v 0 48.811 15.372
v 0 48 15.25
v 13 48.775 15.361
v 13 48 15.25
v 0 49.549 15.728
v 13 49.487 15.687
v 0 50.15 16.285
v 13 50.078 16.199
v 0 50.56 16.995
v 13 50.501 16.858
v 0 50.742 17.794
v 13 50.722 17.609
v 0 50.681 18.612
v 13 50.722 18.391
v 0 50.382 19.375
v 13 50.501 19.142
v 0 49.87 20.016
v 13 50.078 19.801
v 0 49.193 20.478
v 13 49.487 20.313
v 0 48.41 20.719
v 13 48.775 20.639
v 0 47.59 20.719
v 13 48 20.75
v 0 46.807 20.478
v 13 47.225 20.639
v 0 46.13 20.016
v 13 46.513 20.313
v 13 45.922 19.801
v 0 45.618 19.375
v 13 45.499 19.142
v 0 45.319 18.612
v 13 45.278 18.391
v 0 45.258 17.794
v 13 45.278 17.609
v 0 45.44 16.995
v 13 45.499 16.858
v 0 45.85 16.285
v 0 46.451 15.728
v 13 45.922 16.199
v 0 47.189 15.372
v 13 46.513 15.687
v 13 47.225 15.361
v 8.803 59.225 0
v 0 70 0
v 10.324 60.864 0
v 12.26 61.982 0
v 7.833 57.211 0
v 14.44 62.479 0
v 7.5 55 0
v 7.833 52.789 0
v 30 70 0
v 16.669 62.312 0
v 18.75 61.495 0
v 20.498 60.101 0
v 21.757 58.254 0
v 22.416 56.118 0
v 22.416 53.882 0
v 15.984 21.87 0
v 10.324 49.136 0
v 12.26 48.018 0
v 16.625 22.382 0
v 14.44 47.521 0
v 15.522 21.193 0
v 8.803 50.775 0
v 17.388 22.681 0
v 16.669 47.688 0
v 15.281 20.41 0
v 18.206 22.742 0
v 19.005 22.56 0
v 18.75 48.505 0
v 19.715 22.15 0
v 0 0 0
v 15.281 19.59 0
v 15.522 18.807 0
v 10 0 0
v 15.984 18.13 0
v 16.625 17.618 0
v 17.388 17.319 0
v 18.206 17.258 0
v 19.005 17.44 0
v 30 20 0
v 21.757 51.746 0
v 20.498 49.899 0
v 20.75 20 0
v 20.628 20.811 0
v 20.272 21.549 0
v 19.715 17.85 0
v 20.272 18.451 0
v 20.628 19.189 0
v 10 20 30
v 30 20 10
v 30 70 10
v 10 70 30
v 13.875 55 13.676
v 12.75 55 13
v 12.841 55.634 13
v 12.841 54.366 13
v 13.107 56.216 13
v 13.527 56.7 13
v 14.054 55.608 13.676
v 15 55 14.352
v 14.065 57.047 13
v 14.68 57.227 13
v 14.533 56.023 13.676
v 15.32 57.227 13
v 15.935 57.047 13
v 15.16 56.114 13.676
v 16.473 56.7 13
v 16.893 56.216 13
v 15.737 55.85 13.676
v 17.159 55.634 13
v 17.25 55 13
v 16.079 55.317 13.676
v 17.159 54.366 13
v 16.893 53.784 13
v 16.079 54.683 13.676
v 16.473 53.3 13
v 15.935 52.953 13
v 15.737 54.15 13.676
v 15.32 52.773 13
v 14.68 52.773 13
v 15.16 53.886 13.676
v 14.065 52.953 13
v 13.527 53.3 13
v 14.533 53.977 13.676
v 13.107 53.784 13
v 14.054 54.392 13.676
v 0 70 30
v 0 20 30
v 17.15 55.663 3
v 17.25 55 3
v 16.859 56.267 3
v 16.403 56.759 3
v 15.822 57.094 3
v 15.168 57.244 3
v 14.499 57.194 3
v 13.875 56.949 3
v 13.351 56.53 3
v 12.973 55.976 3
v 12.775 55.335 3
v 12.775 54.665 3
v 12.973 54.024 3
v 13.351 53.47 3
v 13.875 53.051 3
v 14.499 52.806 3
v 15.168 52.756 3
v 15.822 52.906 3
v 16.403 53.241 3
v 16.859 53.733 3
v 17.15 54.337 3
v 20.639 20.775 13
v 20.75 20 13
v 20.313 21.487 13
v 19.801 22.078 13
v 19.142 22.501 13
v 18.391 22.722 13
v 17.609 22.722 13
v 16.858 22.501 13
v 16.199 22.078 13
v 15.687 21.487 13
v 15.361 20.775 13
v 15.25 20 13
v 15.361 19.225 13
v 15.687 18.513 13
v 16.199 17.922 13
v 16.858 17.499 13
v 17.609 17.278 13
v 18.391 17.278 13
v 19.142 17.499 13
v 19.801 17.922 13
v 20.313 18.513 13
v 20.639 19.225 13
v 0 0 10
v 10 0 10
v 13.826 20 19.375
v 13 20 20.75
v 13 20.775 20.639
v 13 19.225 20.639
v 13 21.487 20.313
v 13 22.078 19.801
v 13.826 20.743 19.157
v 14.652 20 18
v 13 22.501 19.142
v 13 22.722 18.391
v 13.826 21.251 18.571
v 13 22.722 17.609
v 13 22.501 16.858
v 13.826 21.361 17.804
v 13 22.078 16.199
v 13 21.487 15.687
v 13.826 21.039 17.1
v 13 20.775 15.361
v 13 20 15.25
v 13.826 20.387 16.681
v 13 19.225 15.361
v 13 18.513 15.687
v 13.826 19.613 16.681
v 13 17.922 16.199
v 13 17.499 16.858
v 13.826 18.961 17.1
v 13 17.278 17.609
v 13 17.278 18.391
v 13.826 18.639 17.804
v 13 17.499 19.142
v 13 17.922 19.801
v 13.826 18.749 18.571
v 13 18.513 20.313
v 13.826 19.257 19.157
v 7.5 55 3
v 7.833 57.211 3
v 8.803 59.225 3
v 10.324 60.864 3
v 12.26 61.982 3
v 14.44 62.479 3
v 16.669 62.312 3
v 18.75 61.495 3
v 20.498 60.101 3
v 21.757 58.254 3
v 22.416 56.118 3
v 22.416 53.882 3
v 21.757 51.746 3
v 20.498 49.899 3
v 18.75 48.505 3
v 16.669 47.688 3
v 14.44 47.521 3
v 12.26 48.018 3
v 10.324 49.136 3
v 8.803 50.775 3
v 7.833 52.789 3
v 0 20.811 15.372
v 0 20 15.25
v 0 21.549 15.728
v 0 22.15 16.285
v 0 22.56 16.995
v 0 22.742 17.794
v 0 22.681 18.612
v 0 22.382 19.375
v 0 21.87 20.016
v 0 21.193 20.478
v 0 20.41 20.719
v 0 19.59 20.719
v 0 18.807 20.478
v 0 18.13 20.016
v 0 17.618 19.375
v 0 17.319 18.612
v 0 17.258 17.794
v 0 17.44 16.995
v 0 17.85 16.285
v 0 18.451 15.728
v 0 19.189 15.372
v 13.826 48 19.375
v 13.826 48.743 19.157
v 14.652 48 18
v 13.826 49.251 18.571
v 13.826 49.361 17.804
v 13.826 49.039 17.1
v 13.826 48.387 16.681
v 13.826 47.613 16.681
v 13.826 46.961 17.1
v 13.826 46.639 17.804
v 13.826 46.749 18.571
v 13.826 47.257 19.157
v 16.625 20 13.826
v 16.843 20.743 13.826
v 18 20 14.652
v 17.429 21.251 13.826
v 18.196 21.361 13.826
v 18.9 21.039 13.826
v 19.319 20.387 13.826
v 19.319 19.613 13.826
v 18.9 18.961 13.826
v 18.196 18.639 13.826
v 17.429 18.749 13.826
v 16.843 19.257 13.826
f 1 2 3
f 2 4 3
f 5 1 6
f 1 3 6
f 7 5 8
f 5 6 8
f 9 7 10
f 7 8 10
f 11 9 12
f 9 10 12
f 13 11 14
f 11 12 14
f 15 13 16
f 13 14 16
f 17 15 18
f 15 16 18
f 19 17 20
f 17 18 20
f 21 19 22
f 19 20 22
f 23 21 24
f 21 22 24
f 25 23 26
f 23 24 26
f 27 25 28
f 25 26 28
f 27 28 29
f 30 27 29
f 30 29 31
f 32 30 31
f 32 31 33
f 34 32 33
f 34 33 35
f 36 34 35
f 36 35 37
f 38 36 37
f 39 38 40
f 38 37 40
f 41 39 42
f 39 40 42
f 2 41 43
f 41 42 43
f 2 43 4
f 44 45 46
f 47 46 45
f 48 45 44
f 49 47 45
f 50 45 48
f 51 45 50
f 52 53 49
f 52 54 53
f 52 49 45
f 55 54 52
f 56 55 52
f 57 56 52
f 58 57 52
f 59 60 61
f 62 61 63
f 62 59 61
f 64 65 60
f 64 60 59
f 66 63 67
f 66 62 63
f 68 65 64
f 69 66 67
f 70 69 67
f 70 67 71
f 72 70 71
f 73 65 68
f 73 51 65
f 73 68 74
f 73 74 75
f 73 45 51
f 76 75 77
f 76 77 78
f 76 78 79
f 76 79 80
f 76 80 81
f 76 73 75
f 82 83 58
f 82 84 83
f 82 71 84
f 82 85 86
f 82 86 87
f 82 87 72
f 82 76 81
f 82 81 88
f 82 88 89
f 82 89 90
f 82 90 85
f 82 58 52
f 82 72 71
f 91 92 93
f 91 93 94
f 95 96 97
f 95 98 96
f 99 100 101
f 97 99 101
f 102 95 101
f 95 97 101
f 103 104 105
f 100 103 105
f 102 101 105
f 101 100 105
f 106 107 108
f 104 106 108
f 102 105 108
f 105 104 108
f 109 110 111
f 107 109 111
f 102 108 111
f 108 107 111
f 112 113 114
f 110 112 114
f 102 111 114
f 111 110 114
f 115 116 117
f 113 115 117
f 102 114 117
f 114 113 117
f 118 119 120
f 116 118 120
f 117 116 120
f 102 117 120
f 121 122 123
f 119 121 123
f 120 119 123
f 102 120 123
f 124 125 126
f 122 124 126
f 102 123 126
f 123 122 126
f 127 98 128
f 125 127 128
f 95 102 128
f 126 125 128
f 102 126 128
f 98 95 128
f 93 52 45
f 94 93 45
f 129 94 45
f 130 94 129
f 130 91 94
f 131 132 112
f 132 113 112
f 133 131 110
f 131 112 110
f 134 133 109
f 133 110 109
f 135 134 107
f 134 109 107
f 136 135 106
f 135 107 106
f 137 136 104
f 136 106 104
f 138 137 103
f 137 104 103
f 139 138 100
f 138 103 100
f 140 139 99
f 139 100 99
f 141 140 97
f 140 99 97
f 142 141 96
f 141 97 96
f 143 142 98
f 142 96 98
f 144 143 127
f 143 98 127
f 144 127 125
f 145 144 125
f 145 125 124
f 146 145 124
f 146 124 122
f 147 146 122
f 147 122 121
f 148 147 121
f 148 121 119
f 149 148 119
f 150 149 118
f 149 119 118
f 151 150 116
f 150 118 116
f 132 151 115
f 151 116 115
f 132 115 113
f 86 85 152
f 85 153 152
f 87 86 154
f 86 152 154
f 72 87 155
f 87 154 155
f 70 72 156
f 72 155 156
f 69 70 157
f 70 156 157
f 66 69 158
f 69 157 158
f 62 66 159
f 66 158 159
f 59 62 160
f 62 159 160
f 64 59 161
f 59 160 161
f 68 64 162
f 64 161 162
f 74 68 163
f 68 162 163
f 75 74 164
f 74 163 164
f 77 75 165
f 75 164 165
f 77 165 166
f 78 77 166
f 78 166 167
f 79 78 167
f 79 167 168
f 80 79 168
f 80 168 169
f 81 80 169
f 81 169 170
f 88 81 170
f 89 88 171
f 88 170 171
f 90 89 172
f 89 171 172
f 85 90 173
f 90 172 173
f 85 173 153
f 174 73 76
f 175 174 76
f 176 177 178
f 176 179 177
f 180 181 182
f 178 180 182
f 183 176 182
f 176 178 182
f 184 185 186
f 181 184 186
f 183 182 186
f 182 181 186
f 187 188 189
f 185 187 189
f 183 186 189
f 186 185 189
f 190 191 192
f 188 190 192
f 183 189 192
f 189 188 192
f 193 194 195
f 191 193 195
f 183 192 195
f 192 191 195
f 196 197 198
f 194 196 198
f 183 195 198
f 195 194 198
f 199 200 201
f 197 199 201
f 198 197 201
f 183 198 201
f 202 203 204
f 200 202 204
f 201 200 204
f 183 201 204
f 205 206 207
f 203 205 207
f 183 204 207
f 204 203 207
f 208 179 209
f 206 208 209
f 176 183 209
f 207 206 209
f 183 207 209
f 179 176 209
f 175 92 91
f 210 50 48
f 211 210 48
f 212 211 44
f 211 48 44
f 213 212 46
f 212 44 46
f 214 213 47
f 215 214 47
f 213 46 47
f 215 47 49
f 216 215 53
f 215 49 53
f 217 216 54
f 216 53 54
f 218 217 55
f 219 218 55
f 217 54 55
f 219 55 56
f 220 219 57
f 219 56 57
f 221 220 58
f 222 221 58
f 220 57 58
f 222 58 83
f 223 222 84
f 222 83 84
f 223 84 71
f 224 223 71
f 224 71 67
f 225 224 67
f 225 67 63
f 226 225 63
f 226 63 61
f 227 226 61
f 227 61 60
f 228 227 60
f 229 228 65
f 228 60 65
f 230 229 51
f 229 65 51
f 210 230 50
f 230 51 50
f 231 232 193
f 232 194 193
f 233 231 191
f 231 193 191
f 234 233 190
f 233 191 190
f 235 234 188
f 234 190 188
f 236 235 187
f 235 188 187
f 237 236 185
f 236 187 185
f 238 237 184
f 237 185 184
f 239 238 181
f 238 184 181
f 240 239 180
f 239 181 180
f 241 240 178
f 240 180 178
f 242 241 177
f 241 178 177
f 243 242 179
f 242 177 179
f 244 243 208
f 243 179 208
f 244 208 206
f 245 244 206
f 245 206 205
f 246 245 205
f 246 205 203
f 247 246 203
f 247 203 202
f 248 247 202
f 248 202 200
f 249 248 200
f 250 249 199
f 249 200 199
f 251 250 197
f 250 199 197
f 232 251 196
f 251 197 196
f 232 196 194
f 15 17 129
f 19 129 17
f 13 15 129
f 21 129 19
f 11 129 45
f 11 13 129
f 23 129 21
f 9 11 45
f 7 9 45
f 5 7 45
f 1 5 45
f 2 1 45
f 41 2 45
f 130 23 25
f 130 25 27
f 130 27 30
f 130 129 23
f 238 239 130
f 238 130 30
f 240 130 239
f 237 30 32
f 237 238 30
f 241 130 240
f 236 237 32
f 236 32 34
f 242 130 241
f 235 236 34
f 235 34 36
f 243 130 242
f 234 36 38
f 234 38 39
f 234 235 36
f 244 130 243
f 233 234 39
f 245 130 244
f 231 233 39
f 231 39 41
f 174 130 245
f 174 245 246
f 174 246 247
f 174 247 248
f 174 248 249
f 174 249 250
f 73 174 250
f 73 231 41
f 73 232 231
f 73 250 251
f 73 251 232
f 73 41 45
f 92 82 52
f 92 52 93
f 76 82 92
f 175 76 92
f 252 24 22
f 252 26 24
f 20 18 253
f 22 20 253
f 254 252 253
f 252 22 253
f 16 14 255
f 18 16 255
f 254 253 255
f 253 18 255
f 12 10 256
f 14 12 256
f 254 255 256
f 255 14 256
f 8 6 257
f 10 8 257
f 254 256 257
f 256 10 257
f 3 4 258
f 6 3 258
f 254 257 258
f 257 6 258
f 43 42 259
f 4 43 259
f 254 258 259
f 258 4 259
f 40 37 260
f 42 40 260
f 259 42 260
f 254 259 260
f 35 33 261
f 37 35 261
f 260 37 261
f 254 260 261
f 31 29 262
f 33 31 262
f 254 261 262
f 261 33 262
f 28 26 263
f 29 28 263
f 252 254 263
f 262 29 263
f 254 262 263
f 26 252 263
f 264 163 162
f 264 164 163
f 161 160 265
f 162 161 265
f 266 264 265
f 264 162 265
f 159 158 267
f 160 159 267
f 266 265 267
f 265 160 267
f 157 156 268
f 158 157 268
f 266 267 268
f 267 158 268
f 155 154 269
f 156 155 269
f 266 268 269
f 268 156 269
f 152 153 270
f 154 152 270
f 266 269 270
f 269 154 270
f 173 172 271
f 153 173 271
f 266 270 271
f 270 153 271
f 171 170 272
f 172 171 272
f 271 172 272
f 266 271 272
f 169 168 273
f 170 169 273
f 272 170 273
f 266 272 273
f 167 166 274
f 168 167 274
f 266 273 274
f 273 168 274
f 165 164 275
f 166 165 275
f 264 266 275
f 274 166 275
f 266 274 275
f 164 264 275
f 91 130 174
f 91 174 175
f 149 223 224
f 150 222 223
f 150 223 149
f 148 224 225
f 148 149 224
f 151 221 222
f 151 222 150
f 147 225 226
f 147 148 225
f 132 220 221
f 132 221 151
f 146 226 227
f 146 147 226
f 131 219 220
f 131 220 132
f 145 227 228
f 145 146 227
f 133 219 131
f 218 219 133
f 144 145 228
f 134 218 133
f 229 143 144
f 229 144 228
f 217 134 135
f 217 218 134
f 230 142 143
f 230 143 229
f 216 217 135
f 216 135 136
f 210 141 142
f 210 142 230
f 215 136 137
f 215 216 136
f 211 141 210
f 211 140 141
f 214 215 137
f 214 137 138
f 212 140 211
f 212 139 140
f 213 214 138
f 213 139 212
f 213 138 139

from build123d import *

# Parameters (mm, degrees)
SCHIZZO1_W                   = 30
SCHIZZO1_H                   = 40
ESTRUSIONE_ESTRUSIONE1_DEPTH = 30
SMUSSO1_SIZE                 = 20
ESTRUSIONE_ESTRUSIONE2_DEPTH = 30
FORO_PER_VITE_M5_1_D         = 5.5
FORO_PER_VITE_M5_1_DEPTH     = 13
FORO_PER_VITE_M5_1_TIP       = 1.652366702
FORO_PER_VITE_M5_2_D         = 5.5
FORO_PER_VITE_M5_2_DEPTH     = 13
FORO_PER_VITE_M5_2_TIP       = 1.652366702
SCHIZZO6_R                   = 7.5
TAGLIO_ESTRUSIONE1_DEPTH     = 3
FORO_PER_VITE_M4_1_D         = 4.5
FORO_PER_VITE_M4_1_DEPTH     = 10
FORO_PER_VITE_M4_1_TIP       = 1.351936393


with BuildPart() as part:
    # Schizzo1 → Estrusione-Estrusione1 (new body)
    with BuildSketch(Plane.XY):
        with Locations((15, 20)):
            Rectangle(SCHIZZO1_W, SCHIZZO1_H)
    extrude(amount=ESTRUSIONE_ESTRUSIONE1_DEPTH)

    # Smusso1
    smusso1_edges = [part.edges().sort_by_distance(p)[0] for p in [
        (30, 20, 30),
        (30, 0, 15),
        (15, 0, 30),
    ]]
    chamfer(smusso1_edges, length=SMUSSO1_SIZE)

    # Schizzo2 → Estrusione-Estrusione2 (add)
    with BuildSketch(Plane(origin=(0, 40, 0), x_dir=(1, 0, 0), z_dir=(0, 1, 0))):
        Polygon((0, 0), (30, 0), (30, -10), (10, -30), (0, -30), align=None)
    extrude(amount=ESTRUSIONE_ESTRUSIONE2_DEPTH)

    # Foro per Vite M5-1
    with Locations(Plane.ZY):
        with Locations((18, 20), (18, 48)):
            Hole(FORO_PER_VITE_M5_1_D / 2, depth=FORO_PER_VITE_M5_1_DEPTH)
            with Locations((0, 0, -(FORO_PER_VITE_M5_1_DEPTH + FORO_PER_VITE_M5_1_TIP / 2))):  # 118° drill point
                Cone(0, FORO_PER_VITE_M5_1_D / 2, FORO_PER_VITE_M5_1_TIP, mode=Mode.SUBTRACT)

    # Foro per Vite M5-2
    with Locations(Plane(origin=(18, 20, 0), x_dir=(-1, 0, 0), z_dir=(0, 0, -1))):
        with Locations((0, 0)):
            Hole(FORO_PER_VITE_M5_2_D / 2, depth=FORO_PER_VITE_M5_2_DEPTH)
            with Locations((0, 0, -(FORO_PER_VITE_M5_2_DEPTH + FORO_PER_VITE_M5_2_TIP / 2))):  # 118° drill point
                Cone(0, FORO_PER_VITE_M5_2_D / 2, FORO_PER_VITE_M5_2_TIP, mode=Mode.SUBTRACT)

    # Schizzo6 → Taglio-Estrusione1 (cut)
    with BuildSketch(Plane(origin=(0, 0, 0), x_dir=(-1, 0, 0), z_dir=(0, 0, -1))):
        with Locations((-15, 55)):
            Circle(SCHIZZO6_R)
    extrude(amount=-TAGLIO_ESTRUSIONE1_DEPTH, mode=Mode.SUBTRACT)

    # Foro per Vite M4-1
    with Locations(Plane(origin=(0, 0, 3), x_dir=(-1, 0, 0), z_dir=(0, 0, -1))):
        with Locations((-15, 55)):
            Hole(FORO_PER_VITE_M4_1_D / 2, depth=FORO_PER_VITE_M4_1_DEPTH)
            with Locations((0, 0, -(FORO_PER_VITE_M4_1_DEPTH + FORO_PER_VITE_M4_1_TIP / 2))):  # 118° drill point
                Cone(0, FORO_PER_VITE_M4_1_D / 2, FORO_PER_VITE_M4_1_TIP, mode=Mode.SUBTRACT)


solid = part.part
